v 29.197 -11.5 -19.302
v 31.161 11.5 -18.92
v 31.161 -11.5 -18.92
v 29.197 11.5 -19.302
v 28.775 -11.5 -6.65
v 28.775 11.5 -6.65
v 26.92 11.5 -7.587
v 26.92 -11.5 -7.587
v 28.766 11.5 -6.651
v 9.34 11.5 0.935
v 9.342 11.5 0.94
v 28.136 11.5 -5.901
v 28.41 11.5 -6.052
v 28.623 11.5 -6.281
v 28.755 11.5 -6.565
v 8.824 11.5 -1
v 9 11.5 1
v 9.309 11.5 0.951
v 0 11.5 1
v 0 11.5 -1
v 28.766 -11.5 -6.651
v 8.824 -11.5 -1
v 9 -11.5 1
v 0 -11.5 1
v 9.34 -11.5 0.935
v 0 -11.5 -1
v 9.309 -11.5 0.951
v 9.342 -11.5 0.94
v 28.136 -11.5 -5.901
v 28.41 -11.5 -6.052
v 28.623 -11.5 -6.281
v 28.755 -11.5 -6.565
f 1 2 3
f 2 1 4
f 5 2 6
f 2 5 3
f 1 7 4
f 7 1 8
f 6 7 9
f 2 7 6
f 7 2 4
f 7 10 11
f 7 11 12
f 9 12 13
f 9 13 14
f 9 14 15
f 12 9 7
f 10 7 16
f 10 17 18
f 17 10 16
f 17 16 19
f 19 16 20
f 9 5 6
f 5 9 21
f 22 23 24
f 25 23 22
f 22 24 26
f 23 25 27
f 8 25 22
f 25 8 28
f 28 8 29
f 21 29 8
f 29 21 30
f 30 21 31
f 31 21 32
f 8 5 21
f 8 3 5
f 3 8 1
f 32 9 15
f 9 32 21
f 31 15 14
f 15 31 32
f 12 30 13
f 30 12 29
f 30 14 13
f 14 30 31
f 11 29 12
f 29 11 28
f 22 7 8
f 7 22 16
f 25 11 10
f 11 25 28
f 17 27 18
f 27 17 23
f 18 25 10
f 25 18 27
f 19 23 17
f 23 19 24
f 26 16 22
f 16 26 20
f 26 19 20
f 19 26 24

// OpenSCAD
$fn=20;

width=23;
thick=2;
slice1=9;
slice2=20;
slice3=12.5;
angle1=20;
angle2=79;


//cubes
translate([slice1/2,0,0]) cube([slice1,width,thick],true);
translate([slice1,0,0]){
  #rotate([90,0,0]) cylinder(d=thick,h=width,center=true);
  rotate([0,angle1,0]){
    translate([slice2/2,0,0]) cube([slice2,width,thick],true);
    //slice3
    translate([slice2,0,0]){
      rotate([0,angle2-angle1,0]) translate([slice3/2,0,0]) cube([slice3,width,thick],true);
      #rotate([90,0,0]) cylinder(d=thick,h=width,center=true);
    }
  }
}
